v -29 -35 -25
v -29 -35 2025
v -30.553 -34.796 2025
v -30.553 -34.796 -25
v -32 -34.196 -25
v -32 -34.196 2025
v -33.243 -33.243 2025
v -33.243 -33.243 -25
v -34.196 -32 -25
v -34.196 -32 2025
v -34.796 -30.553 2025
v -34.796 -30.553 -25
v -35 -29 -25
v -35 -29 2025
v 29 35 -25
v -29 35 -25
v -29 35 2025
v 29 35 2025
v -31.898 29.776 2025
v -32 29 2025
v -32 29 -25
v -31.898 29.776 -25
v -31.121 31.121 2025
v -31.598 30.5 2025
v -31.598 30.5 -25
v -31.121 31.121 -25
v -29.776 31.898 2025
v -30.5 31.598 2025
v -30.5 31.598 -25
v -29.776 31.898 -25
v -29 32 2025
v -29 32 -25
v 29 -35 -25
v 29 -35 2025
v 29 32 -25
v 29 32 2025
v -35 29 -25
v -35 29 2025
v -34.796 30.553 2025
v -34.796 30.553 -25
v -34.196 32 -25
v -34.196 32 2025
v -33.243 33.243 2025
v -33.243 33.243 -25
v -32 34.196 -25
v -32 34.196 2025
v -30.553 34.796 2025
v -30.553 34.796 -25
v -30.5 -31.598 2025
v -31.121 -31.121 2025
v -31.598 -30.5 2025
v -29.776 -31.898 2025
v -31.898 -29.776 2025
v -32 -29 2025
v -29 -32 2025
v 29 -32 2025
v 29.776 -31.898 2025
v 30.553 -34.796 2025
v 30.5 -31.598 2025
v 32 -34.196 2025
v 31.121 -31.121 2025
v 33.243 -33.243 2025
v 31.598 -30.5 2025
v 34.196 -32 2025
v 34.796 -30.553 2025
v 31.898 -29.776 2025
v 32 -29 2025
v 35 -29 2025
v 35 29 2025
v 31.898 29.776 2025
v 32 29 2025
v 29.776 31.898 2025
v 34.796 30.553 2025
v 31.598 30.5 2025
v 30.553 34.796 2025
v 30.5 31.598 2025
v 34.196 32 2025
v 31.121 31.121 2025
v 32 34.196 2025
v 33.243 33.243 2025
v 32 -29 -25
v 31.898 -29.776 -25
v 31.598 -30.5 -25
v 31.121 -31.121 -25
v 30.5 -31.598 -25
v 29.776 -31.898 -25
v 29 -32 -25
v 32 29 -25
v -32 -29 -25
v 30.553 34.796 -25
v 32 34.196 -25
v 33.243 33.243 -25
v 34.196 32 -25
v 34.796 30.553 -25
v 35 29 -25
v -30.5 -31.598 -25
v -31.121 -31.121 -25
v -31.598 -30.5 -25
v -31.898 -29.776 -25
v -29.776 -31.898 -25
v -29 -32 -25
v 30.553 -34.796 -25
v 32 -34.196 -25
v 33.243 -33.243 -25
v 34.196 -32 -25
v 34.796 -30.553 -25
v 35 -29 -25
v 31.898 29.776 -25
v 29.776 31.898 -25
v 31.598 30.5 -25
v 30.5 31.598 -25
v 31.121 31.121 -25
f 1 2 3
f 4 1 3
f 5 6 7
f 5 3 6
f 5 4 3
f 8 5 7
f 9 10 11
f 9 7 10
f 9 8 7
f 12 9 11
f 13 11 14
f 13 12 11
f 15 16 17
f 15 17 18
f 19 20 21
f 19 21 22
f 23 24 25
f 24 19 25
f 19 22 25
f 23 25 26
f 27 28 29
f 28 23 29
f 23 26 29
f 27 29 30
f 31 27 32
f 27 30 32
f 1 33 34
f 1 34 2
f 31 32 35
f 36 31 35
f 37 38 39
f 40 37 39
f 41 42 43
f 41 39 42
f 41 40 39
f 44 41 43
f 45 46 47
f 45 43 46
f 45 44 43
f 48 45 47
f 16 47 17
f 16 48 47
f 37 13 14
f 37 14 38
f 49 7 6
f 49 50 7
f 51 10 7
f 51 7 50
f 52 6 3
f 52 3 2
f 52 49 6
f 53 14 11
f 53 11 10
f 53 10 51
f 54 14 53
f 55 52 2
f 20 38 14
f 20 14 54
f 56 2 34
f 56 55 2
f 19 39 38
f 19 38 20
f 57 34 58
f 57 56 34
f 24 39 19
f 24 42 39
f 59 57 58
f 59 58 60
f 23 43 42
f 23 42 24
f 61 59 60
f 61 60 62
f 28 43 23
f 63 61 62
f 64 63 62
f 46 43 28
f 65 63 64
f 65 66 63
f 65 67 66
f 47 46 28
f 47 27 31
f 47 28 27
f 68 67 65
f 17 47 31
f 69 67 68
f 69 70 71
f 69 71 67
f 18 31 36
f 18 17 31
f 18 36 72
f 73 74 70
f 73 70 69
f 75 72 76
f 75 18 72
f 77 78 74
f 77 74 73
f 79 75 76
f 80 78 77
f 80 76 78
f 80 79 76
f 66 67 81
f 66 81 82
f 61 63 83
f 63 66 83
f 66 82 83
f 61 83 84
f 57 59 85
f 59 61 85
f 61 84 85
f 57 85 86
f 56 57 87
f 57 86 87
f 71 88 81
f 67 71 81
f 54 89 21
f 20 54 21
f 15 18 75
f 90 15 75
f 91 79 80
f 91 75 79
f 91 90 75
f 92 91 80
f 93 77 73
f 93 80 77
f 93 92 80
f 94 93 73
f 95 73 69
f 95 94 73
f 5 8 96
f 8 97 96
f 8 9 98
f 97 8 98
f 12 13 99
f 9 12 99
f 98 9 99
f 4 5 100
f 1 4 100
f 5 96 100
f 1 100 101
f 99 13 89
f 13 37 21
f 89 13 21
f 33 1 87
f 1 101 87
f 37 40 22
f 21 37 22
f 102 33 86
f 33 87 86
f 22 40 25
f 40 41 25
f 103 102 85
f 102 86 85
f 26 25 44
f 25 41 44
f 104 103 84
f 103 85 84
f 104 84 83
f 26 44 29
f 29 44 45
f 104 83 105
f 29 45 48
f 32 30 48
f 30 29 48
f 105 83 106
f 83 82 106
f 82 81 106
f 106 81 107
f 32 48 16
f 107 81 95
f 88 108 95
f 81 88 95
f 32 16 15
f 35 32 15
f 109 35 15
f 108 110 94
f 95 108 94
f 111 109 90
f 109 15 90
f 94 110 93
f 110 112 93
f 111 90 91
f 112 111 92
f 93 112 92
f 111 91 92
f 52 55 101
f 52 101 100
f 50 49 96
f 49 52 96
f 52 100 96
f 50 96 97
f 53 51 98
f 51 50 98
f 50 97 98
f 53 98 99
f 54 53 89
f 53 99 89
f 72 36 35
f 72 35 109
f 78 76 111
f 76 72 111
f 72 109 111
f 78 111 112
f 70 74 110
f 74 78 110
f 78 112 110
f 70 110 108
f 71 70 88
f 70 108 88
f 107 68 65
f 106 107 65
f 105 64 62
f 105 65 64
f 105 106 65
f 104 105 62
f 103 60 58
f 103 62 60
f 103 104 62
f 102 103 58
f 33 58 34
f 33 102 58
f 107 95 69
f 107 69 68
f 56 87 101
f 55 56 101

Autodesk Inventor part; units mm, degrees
ref_plane "YZ Plane" through (0, 0, 0) normal (1, 0, 0) x (0, 1, 0)
ref_plane "Plano inicial" through (0, 0, -25) normal (0, 0, 1) x (1, 0, 0)
ref_plane "Plano final" through (0, 0, 2025) normal (0, 0, 1) x (1, 0, 0)
sketch "Boceto" plane through (0, 0, 0) normal (0, 0, 1) x (1, 0, 0)
  line L0 (-35, -29) -> (-35, 29)
  line L1 (-29, 35) -> (29, 35)
  line L2 (35, 29) -> (35, -29)
  line L3 (29, -35) -> (-29, -35)
  arc A0 (-35, -29) -> (-29, -35) centre (-29, -29) ccw
  arc A1 (35, 29) -> (29, 35) centre (29, 29) ccw
  arc A2 (-29, 35) -> (-35, 29) centre (-29, 29) ccw
  arc A3 (29, -35) -> (35, -29) centre (29, -29) ccw
  arc A4 (-29, 32) -> (-32, 29) centre (-29, 29) ccw
  line L4 (-29, 32) -> (29, 32)
  arc A5 (32, 29) -> (29, 32) centre (29, 29) ccw
  line L5 (32, 29) -> (32, -29)
  arc A6 (29, -32) -> (32, -29) centre (29, -29) ccw
  line L6 (29, -32) -> (-29, -32)
  arc A7 (-32, -29) -> (-29, -32) centre (-29, -29) ccw
  line L7 (-32, -29) -> (-32, 29)
  line L8 (0, 50.7397) -> (0, -50.7397) construction
  line L9 (-50.7397, 0) -> (50.7397, 0) construction
  dimension "d7" = 6
  dimension "d9" = 70
  dimension "d11" = 70
  dimension "d12" = 3
  dimension "d15" = 35
  dimension "d16" = 35
extrude "Cuerpo" add sketch "Boceto" along normal up to surface (2050 mm away) from surface at -25
sketch "Sketch3" plane through (0, 0, 0) normal (0, 0, 1) x (1, 0, 0)
  line L0 (0, 0) -> (10, 0)
ref_plane "Work Plane3" through (0, 0, 0) normal (0, -1, 0) x (1, 0, 0)
sketch "Sketch4" plane through (0, 0, 0) normal (0, -1, 0) x (1, 0, 0)
  line L0 (-2, -25) -> (12, -25)
  line L1 (-2, 2025) -> (12, 2025)
  dimension "d18" = 2050
equation "\"d7\" = G_IR"
equation "\"d9\" = G_W"
equation "\"d11\" = G_H"
equation "\"d12\" = G_T"
equation "\"d15\" = 0.5 * d9"
equation "\"d16\" = 0.5 * d11"
equation "\"d3\" = G_L"
equation "\"G_W\" = 70"
equation "\"G_H\" = 70"
equation "\"G_T\" = 3"
equation "\"G_IR\" = 6"
equation "\"G_L\" = d18"
equation "\"G_OFFSET_START\" = 25"
equation "\"G_OFFSET_END\" = 25"
equation "\"d13\" = -G_OFFSET_START"
equation "\"d14\" = G_OFFSET_END + B_L"
equation "\"B_L\" = 2000"
properties part number "ISO 10799-2 - 70x70x3 - 2050" material "Galvanizado catalogo 2"
